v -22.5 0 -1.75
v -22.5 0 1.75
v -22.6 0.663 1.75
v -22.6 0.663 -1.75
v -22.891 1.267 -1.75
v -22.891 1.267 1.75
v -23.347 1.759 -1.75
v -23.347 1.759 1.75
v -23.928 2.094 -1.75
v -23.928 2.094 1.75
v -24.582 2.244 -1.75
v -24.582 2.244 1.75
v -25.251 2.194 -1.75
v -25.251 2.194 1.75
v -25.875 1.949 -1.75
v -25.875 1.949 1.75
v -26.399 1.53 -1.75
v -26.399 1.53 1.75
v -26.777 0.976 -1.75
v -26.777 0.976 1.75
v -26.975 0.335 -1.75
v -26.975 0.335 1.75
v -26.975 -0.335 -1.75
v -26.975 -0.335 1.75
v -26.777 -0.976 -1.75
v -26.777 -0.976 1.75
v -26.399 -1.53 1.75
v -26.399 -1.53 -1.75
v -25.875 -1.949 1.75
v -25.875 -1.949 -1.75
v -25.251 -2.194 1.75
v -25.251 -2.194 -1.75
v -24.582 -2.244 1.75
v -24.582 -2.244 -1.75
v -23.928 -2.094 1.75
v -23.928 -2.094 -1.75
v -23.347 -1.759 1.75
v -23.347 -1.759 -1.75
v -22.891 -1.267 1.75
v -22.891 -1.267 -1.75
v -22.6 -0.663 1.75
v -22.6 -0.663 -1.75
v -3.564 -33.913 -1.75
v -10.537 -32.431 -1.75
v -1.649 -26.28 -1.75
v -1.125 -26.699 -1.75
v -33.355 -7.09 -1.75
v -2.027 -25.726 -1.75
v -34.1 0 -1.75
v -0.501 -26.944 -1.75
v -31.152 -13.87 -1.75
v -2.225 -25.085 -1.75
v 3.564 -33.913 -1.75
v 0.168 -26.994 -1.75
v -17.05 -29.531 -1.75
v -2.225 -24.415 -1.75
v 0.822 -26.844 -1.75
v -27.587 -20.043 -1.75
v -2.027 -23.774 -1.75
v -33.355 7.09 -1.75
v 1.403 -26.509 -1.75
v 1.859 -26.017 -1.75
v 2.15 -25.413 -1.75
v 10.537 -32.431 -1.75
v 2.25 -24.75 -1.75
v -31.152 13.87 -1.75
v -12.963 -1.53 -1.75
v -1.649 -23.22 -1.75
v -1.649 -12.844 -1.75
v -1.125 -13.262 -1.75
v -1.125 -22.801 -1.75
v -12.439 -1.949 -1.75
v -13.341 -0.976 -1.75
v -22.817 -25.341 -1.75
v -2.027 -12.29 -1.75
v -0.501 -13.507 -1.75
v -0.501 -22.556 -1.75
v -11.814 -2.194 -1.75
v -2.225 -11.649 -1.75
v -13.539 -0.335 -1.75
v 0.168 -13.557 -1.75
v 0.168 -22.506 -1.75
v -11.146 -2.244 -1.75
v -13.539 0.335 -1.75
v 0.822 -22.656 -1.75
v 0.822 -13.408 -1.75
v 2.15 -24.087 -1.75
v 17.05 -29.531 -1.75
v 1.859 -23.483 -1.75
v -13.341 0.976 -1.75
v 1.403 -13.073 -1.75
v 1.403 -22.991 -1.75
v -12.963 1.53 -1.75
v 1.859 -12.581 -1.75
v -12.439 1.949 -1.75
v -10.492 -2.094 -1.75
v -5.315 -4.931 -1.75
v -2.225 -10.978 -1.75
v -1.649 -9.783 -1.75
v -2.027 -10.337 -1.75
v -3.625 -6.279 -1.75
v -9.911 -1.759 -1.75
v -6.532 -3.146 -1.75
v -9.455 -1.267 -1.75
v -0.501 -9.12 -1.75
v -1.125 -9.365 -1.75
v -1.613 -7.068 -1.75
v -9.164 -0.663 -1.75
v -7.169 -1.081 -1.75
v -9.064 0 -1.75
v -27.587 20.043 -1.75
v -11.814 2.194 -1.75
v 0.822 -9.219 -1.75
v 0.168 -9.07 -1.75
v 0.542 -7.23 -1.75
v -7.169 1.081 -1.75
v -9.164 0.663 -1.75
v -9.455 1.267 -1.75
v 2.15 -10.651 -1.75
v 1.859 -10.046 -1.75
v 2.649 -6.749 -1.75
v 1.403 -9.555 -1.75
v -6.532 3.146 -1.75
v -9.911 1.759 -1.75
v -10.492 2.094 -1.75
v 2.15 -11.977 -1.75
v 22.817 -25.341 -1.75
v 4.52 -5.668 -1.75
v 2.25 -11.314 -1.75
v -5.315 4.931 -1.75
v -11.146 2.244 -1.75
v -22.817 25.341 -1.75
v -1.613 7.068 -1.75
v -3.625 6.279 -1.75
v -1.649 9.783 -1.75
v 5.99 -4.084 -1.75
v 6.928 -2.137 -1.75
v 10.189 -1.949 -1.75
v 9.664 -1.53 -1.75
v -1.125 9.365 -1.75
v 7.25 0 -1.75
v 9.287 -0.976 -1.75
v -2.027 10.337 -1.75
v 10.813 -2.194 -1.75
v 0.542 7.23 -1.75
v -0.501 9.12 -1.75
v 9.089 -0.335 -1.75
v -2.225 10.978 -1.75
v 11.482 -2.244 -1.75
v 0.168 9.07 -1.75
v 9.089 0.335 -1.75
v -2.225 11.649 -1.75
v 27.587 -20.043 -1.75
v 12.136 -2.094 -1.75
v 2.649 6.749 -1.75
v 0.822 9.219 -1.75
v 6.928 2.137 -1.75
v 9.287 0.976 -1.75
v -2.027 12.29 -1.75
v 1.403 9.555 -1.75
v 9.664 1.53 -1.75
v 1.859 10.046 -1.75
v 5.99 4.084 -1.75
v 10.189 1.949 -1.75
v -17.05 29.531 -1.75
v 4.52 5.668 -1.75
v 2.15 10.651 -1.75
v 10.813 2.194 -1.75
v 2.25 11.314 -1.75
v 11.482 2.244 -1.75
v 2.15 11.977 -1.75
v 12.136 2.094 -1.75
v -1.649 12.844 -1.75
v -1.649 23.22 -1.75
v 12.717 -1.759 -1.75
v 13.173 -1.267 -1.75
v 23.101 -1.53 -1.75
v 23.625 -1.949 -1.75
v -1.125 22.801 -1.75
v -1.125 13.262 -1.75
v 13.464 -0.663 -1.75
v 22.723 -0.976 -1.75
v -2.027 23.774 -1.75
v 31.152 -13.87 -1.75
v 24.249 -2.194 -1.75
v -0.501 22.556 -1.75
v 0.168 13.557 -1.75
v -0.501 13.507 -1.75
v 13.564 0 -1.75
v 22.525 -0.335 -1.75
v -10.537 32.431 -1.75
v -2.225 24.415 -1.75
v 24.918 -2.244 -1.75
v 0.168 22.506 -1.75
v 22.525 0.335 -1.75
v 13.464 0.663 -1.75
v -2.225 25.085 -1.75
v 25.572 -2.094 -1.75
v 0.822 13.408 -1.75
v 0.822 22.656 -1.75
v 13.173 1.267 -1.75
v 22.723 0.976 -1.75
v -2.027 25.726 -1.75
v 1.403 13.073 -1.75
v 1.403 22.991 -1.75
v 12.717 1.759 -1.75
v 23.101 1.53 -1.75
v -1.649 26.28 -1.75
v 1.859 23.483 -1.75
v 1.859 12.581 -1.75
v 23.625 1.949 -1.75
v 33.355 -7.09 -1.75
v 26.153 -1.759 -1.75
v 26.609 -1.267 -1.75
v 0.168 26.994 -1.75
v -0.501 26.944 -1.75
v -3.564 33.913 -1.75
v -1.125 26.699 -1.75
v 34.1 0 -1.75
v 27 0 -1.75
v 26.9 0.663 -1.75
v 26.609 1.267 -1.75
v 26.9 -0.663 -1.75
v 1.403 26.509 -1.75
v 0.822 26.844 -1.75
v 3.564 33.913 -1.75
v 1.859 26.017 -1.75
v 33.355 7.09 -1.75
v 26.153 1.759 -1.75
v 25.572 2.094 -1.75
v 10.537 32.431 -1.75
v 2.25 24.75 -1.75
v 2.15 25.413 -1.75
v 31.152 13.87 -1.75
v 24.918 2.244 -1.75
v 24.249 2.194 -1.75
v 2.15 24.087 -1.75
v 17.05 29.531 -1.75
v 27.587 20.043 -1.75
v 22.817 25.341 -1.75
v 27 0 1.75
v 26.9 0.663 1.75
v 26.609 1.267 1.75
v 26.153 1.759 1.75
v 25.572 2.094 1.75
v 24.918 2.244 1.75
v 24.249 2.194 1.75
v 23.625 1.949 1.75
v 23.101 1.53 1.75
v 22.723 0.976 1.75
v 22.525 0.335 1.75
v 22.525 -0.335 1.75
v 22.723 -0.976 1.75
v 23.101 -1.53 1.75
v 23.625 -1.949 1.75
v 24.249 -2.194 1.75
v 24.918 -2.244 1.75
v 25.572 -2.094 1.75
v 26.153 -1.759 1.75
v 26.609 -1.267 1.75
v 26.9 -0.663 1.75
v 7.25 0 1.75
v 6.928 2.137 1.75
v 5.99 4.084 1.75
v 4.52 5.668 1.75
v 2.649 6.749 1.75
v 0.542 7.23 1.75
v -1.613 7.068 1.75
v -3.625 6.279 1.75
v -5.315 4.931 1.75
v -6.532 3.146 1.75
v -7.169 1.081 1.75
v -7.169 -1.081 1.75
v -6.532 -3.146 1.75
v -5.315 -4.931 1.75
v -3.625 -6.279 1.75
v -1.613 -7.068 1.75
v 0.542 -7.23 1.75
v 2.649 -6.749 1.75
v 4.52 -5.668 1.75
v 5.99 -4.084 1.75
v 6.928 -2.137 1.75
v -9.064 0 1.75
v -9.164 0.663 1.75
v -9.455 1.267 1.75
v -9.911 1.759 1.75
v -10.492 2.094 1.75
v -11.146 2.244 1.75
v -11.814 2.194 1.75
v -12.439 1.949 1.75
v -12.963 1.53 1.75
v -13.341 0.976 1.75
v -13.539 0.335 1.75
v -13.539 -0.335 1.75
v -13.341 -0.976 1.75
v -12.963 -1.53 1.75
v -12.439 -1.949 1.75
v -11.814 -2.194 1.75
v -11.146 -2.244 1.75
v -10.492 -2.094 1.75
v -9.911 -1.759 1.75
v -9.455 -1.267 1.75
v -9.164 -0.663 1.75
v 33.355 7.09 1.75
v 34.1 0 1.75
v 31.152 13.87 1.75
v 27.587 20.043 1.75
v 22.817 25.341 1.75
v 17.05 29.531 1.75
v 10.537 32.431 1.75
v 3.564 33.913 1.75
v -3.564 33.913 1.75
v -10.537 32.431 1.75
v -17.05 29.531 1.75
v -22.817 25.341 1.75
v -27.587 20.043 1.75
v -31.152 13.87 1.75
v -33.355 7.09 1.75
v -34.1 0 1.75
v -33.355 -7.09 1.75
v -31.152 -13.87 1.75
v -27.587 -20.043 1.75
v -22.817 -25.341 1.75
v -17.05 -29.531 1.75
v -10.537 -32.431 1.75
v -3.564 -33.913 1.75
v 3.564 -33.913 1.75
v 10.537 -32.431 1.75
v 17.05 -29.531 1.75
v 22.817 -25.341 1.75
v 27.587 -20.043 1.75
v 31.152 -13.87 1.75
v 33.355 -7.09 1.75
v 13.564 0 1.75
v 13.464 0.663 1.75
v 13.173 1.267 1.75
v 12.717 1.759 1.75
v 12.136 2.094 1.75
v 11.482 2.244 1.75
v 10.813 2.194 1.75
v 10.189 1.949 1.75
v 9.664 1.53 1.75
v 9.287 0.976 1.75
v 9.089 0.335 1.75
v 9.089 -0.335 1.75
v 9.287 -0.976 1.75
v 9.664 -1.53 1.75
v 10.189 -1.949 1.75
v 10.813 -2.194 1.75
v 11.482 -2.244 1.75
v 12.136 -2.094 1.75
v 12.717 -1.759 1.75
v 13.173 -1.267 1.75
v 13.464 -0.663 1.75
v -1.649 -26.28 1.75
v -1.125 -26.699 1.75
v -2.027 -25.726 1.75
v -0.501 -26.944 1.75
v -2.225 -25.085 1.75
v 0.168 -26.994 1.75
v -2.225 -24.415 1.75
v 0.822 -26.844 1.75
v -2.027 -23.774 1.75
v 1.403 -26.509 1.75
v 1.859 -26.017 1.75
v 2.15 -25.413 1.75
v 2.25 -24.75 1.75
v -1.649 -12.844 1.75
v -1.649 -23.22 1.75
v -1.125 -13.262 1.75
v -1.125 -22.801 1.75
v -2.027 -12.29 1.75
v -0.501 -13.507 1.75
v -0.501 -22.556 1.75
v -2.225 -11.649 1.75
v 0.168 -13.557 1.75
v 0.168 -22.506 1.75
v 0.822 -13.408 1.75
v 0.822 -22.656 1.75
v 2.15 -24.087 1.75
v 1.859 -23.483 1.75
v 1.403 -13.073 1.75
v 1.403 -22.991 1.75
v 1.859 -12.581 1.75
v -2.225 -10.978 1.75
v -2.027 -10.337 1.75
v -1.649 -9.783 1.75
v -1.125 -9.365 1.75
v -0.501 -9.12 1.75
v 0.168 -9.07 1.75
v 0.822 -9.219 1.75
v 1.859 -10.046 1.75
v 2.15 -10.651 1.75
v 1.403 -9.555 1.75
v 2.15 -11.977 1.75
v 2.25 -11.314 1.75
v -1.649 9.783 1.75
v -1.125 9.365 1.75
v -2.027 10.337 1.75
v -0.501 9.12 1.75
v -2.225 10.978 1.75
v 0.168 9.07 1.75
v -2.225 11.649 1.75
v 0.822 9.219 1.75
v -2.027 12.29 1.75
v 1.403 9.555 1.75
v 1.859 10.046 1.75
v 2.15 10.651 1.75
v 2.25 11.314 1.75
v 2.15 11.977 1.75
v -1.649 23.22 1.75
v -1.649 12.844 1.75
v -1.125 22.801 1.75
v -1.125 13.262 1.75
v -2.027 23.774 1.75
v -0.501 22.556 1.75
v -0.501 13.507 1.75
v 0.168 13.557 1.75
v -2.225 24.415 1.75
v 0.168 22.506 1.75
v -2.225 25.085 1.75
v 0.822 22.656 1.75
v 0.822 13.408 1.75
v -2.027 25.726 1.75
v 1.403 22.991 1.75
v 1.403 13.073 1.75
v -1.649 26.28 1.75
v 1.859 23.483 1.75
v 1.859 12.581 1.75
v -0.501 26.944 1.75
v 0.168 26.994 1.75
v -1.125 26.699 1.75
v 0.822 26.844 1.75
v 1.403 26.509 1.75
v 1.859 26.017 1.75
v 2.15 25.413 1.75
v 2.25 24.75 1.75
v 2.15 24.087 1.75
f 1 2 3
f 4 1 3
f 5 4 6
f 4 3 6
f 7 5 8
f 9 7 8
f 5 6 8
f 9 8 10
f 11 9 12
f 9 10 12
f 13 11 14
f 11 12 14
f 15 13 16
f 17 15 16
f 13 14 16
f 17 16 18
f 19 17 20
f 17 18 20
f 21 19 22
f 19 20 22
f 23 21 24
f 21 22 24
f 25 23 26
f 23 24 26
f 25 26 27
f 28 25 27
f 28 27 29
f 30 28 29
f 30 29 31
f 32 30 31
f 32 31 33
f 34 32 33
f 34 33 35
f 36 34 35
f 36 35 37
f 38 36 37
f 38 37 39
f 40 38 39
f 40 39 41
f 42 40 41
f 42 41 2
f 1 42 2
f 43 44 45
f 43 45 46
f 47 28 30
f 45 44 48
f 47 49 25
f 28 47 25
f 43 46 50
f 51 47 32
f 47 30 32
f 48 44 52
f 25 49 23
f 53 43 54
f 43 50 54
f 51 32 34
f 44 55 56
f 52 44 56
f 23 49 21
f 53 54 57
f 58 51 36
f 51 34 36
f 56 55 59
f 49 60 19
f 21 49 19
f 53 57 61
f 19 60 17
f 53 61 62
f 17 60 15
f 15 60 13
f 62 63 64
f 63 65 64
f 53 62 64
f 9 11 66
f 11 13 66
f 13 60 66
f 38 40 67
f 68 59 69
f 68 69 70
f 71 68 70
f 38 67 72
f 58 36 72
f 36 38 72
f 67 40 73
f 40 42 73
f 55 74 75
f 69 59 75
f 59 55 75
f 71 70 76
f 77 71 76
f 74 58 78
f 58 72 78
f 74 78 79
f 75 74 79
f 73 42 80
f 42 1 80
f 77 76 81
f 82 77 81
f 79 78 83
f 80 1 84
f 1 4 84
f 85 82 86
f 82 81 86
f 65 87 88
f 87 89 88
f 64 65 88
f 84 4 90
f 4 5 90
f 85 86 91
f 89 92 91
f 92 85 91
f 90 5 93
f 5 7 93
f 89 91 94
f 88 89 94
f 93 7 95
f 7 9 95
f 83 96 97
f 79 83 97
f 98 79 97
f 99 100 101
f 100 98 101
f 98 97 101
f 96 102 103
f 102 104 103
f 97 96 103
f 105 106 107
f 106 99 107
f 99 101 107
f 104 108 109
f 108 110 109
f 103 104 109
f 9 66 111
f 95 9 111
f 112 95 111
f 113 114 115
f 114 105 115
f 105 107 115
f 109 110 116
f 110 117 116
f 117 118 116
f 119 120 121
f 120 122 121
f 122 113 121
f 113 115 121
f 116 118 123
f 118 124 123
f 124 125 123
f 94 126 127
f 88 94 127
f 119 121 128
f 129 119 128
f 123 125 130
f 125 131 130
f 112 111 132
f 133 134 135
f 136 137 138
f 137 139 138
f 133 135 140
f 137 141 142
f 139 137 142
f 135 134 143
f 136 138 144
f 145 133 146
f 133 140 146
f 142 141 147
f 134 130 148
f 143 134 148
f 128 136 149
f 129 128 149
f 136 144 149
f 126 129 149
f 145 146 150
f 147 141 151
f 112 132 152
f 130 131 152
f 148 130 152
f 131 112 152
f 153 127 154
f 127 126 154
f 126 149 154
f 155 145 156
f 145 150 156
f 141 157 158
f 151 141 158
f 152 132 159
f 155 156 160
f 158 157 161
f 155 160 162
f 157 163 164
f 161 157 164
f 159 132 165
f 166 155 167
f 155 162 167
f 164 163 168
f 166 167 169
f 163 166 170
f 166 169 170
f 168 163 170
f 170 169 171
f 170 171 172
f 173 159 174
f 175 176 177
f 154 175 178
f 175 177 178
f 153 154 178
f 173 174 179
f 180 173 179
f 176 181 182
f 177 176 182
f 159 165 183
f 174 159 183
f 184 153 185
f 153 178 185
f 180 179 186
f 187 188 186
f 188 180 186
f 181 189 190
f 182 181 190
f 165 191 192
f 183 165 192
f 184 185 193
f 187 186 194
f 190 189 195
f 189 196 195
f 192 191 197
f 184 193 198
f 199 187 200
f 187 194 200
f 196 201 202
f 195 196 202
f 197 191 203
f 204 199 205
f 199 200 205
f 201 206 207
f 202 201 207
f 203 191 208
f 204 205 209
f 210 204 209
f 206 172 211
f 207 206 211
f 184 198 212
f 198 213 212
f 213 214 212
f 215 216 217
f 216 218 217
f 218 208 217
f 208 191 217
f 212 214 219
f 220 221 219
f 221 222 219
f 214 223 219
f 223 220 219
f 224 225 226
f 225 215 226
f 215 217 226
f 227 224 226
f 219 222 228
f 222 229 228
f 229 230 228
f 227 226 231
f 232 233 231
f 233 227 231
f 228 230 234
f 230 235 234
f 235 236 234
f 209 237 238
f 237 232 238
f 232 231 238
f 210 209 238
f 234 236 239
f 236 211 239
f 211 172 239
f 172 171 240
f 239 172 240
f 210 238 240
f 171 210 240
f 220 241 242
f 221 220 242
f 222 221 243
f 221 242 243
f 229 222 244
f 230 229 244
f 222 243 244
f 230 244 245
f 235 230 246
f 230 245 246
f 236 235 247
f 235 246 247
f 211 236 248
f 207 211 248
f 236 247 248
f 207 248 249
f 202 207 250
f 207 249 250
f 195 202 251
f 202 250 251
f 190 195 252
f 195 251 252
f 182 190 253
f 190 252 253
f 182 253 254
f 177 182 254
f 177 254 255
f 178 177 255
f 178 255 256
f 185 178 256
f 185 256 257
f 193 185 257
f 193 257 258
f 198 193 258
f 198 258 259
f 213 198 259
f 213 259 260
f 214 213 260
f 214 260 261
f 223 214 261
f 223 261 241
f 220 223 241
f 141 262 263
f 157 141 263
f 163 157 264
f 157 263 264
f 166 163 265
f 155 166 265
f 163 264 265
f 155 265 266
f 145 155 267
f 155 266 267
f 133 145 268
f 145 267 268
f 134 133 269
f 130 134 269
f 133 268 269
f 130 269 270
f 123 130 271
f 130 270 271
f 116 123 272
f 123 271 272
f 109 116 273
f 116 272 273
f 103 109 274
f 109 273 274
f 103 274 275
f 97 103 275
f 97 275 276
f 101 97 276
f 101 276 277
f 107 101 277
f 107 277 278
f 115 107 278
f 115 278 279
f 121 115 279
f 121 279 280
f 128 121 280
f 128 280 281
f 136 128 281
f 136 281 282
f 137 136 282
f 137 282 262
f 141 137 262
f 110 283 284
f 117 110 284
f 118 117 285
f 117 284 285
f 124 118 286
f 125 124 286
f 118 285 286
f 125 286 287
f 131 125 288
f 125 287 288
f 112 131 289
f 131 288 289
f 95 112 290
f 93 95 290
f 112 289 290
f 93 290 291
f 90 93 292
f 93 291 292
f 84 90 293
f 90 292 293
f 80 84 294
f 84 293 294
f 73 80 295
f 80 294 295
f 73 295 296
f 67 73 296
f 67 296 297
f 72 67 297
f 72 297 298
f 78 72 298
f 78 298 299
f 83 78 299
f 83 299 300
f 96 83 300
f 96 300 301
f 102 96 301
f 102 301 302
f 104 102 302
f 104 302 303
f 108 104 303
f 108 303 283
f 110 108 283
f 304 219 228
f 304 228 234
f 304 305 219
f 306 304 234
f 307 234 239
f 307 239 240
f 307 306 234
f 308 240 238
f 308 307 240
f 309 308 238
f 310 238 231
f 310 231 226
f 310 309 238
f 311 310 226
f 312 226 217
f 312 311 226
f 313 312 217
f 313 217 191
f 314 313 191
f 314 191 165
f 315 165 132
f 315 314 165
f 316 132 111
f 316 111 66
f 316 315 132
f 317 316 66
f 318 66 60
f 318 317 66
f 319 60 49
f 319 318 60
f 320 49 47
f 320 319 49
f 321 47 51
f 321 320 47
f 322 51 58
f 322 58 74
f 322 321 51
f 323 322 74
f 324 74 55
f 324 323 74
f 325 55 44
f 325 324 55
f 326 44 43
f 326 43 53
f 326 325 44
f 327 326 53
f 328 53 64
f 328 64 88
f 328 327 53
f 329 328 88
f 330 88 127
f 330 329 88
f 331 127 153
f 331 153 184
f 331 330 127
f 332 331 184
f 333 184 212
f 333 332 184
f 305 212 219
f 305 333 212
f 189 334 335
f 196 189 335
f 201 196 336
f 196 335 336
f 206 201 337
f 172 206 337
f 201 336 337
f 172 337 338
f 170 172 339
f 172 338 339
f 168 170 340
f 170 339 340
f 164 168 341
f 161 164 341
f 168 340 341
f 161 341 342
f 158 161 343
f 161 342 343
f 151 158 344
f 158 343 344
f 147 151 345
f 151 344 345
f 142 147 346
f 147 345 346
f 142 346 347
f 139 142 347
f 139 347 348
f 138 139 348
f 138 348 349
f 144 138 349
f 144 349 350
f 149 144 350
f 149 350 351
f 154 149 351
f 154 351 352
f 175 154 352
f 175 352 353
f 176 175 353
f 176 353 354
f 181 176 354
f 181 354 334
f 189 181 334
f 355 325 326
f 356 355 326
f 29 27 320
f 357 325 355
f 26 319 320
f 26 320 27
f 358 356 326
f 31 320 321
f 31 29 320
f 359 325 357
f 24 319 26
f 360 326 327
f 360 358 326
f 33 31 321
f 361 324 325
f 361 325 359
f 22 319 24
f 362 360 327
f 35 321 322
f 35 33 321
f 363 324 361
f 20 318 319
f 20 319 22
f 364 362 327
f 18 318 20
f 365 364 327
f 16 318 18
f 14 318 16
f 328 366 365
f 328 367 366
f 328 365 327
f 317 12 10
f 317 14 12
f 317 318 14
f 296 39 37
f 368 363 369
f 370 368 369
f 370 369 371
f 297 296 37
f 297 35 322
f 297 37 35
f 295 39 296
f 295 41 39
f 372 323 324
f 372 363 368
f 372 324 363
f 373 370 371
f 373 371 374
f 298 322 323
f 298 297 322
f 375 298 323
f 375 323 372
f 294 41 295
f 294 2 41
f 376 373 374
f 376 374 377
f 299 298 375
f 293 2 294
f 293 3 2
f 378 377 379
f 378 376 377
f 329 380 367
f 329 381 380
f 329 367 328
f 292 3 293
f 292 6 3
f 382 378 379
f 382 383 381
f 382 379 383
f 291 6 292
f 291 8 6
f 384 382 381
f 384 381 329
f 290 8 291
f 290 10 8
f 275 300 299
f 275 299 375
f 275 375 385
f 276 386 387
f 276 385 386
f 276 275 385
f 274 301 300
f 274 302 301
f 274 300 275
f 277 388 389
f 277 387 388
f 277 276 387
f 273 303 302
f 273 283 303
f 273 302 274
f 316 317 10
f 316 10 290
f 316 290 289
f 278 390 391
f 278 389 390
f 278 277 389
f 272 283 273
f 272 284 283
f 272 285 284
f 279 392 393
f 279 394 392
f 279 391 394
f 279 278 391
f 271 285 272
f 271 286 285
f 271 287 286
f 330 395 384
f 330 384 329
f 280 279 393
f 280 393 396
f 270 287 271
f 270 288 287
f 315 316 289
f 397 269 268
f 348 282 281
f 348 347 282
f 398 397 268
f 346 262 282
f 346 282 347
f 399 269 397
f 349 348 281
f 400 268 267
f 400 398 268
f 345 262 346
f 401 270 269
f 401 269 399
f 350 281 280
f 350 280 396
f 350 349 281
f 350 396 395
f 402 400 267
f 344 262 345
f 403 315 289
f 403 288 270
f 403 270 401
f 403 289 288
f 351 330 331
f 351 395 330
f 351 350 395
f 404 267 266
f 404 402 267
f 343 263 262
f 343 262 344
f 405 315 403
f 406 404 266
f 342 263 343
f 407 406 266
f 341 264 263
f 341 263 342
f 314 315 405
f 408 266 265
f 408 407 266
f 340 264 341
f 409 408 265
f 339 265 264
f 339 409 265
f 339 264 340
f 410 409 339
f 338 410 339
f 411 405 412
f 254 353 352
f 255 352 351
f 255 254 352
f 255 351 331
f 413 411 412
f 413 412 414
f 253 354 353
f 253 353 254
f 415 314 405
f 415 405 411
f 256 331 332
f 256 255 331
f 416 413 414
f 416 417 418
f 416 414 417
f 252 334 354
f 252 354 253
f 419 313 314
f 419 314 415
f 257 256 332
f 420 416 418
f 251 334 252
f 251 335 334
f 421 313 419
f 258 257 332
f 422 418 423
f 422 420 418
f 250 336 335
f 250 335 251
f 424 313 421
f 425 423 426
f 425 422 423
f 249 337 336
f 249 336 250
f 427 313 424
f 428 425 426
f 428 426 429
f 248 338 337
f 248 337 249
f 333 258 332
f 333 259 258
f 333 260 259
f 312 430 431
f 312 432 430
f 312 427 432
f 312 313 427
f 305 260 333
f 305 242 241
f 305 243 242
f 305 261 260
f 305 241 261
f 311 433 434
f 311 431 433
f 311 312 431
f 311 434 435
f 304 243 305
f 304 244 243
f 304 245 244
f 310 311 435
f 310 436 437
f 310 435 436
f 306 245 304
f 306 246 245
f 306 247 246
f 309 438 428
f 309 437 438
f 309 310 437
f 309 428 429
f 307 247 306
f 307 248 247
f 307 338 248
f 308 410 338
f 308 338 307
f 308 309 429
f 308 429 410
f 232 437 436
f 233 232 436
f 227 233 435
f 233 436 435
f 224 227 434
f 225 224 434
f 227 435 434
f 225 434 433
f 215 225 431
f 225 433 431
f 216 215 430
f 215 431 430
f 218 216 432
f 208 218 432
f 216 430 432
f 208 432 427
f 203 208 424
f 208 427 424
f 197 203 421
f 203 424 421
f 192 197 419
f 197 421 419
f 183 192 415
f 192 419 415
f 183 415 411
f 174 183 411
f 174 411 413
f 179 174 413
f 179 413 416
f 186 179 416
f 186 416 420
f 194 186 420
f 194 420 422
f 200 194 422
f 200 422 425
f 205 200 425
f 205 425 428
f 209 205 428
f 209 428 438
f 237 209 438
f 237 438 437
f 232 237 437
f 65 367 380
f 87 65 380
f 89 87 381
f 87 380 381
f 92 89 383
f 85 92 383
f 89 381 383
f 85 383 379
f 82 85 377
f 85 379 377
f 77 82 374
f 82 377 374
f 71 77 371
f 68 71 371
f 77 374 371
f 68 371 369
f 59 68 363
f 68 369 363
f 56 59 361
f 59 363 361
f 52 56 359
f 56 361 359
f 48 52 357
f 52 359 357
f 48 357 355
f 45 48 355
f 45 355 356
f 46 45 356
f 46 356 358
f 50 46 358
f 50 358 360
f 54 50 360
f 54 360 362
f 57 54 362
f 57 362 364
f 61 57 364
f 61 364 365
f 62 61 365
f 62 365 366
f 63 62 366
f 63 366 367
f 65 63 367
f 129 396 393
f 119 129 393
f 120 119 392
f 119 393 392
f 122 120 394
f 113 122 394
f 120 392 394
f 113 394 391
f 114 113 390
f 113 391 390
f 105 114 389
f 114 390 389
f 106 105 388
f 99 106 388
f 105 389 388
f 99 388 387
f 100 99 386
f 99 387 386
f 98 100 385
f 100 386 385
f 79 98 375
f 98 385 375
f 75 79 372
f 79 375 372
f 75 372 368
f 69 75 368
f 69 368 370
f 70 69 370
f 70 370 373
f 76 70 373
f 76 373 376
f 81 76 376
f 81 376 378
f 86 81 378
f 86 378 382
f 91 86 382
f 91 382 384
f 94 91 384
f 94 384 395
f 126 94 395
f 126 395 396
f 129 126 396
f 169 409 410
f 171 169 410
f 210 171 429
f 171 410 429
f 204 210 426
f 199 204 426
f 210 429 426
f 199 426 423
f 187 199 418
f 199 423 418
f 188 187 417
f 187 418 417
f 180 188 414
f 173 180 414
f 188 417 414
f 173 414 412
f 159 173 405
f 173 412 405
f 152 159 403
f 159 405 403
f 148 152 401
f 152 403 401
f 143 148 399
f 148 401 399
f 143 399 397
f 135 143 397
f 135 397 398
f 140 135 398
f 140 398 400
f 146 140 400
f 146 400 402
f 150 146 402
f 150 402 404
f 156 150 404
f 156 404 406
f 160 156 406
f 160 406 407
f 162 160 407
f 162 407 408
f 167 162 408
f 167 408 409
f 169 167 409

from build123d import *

# Parameters (mm, degrees)
SKETCH1_R           = 34.1
BOSS_EXTRUDE1_DEPTH = 1.75
SKETCH3_R           = 2.25
CUT_EXTRUDE2_DEPTH  = 49.351525312
SKETCH2_R           = 7.25
CUT_EXTRUDE1_DEPTH  = 49.351525312


with BuildPart() as part:
    # Sketch1 → Boss-Extrude1 (new, symmetric)
    with BuildSketch(Plane.XY):
        Circle(SKETCH1_R)
    extrude(amount=BOSS_EXTRUDE1_DEPTH, both=True)

    # Sketch3 → Cut-Extrude2 (cut, through all)
    with BuildSketch(Plane.XY.offset(1.75)):
        with Locations((0, 24.75)):
            Circle(SKETCH3_R)
        with Locations((0, 11.3137085)):
            Circle(SKETCH3_R)
        with Locations((24.75, 0)):
            Circle(SKETCH3_R)
        with Locations((11.3137085, 0)):
            Circle(SKETCH3_R)
        with Locations((0, -24.75)):
            Circle(SKETCH3_R)
        with Locations((0, -11.3137085)):
            Circle(SKETCH3_R)
        with Locations((-24.75, 0)):
            Circle(SKETCH3_R)
        with Locations((-11.3137085, 0)):
            Circle(SKETCH3_R)
    extrude(amount=-CUT_EXTRUDE2_DEPTH, mode=Mode.SUBTRACT)

    # Sketch2 → Cut-Extrude1 (cut, through all)
    with BuildSketch(Plane.XY.offset(1.75)):
        Circle(SKETCH2_R)
    extrude(amount=-CUT_EXTRUDE1_DEPTH, mode=Mode.SUBTRACT)


solid = part.part
